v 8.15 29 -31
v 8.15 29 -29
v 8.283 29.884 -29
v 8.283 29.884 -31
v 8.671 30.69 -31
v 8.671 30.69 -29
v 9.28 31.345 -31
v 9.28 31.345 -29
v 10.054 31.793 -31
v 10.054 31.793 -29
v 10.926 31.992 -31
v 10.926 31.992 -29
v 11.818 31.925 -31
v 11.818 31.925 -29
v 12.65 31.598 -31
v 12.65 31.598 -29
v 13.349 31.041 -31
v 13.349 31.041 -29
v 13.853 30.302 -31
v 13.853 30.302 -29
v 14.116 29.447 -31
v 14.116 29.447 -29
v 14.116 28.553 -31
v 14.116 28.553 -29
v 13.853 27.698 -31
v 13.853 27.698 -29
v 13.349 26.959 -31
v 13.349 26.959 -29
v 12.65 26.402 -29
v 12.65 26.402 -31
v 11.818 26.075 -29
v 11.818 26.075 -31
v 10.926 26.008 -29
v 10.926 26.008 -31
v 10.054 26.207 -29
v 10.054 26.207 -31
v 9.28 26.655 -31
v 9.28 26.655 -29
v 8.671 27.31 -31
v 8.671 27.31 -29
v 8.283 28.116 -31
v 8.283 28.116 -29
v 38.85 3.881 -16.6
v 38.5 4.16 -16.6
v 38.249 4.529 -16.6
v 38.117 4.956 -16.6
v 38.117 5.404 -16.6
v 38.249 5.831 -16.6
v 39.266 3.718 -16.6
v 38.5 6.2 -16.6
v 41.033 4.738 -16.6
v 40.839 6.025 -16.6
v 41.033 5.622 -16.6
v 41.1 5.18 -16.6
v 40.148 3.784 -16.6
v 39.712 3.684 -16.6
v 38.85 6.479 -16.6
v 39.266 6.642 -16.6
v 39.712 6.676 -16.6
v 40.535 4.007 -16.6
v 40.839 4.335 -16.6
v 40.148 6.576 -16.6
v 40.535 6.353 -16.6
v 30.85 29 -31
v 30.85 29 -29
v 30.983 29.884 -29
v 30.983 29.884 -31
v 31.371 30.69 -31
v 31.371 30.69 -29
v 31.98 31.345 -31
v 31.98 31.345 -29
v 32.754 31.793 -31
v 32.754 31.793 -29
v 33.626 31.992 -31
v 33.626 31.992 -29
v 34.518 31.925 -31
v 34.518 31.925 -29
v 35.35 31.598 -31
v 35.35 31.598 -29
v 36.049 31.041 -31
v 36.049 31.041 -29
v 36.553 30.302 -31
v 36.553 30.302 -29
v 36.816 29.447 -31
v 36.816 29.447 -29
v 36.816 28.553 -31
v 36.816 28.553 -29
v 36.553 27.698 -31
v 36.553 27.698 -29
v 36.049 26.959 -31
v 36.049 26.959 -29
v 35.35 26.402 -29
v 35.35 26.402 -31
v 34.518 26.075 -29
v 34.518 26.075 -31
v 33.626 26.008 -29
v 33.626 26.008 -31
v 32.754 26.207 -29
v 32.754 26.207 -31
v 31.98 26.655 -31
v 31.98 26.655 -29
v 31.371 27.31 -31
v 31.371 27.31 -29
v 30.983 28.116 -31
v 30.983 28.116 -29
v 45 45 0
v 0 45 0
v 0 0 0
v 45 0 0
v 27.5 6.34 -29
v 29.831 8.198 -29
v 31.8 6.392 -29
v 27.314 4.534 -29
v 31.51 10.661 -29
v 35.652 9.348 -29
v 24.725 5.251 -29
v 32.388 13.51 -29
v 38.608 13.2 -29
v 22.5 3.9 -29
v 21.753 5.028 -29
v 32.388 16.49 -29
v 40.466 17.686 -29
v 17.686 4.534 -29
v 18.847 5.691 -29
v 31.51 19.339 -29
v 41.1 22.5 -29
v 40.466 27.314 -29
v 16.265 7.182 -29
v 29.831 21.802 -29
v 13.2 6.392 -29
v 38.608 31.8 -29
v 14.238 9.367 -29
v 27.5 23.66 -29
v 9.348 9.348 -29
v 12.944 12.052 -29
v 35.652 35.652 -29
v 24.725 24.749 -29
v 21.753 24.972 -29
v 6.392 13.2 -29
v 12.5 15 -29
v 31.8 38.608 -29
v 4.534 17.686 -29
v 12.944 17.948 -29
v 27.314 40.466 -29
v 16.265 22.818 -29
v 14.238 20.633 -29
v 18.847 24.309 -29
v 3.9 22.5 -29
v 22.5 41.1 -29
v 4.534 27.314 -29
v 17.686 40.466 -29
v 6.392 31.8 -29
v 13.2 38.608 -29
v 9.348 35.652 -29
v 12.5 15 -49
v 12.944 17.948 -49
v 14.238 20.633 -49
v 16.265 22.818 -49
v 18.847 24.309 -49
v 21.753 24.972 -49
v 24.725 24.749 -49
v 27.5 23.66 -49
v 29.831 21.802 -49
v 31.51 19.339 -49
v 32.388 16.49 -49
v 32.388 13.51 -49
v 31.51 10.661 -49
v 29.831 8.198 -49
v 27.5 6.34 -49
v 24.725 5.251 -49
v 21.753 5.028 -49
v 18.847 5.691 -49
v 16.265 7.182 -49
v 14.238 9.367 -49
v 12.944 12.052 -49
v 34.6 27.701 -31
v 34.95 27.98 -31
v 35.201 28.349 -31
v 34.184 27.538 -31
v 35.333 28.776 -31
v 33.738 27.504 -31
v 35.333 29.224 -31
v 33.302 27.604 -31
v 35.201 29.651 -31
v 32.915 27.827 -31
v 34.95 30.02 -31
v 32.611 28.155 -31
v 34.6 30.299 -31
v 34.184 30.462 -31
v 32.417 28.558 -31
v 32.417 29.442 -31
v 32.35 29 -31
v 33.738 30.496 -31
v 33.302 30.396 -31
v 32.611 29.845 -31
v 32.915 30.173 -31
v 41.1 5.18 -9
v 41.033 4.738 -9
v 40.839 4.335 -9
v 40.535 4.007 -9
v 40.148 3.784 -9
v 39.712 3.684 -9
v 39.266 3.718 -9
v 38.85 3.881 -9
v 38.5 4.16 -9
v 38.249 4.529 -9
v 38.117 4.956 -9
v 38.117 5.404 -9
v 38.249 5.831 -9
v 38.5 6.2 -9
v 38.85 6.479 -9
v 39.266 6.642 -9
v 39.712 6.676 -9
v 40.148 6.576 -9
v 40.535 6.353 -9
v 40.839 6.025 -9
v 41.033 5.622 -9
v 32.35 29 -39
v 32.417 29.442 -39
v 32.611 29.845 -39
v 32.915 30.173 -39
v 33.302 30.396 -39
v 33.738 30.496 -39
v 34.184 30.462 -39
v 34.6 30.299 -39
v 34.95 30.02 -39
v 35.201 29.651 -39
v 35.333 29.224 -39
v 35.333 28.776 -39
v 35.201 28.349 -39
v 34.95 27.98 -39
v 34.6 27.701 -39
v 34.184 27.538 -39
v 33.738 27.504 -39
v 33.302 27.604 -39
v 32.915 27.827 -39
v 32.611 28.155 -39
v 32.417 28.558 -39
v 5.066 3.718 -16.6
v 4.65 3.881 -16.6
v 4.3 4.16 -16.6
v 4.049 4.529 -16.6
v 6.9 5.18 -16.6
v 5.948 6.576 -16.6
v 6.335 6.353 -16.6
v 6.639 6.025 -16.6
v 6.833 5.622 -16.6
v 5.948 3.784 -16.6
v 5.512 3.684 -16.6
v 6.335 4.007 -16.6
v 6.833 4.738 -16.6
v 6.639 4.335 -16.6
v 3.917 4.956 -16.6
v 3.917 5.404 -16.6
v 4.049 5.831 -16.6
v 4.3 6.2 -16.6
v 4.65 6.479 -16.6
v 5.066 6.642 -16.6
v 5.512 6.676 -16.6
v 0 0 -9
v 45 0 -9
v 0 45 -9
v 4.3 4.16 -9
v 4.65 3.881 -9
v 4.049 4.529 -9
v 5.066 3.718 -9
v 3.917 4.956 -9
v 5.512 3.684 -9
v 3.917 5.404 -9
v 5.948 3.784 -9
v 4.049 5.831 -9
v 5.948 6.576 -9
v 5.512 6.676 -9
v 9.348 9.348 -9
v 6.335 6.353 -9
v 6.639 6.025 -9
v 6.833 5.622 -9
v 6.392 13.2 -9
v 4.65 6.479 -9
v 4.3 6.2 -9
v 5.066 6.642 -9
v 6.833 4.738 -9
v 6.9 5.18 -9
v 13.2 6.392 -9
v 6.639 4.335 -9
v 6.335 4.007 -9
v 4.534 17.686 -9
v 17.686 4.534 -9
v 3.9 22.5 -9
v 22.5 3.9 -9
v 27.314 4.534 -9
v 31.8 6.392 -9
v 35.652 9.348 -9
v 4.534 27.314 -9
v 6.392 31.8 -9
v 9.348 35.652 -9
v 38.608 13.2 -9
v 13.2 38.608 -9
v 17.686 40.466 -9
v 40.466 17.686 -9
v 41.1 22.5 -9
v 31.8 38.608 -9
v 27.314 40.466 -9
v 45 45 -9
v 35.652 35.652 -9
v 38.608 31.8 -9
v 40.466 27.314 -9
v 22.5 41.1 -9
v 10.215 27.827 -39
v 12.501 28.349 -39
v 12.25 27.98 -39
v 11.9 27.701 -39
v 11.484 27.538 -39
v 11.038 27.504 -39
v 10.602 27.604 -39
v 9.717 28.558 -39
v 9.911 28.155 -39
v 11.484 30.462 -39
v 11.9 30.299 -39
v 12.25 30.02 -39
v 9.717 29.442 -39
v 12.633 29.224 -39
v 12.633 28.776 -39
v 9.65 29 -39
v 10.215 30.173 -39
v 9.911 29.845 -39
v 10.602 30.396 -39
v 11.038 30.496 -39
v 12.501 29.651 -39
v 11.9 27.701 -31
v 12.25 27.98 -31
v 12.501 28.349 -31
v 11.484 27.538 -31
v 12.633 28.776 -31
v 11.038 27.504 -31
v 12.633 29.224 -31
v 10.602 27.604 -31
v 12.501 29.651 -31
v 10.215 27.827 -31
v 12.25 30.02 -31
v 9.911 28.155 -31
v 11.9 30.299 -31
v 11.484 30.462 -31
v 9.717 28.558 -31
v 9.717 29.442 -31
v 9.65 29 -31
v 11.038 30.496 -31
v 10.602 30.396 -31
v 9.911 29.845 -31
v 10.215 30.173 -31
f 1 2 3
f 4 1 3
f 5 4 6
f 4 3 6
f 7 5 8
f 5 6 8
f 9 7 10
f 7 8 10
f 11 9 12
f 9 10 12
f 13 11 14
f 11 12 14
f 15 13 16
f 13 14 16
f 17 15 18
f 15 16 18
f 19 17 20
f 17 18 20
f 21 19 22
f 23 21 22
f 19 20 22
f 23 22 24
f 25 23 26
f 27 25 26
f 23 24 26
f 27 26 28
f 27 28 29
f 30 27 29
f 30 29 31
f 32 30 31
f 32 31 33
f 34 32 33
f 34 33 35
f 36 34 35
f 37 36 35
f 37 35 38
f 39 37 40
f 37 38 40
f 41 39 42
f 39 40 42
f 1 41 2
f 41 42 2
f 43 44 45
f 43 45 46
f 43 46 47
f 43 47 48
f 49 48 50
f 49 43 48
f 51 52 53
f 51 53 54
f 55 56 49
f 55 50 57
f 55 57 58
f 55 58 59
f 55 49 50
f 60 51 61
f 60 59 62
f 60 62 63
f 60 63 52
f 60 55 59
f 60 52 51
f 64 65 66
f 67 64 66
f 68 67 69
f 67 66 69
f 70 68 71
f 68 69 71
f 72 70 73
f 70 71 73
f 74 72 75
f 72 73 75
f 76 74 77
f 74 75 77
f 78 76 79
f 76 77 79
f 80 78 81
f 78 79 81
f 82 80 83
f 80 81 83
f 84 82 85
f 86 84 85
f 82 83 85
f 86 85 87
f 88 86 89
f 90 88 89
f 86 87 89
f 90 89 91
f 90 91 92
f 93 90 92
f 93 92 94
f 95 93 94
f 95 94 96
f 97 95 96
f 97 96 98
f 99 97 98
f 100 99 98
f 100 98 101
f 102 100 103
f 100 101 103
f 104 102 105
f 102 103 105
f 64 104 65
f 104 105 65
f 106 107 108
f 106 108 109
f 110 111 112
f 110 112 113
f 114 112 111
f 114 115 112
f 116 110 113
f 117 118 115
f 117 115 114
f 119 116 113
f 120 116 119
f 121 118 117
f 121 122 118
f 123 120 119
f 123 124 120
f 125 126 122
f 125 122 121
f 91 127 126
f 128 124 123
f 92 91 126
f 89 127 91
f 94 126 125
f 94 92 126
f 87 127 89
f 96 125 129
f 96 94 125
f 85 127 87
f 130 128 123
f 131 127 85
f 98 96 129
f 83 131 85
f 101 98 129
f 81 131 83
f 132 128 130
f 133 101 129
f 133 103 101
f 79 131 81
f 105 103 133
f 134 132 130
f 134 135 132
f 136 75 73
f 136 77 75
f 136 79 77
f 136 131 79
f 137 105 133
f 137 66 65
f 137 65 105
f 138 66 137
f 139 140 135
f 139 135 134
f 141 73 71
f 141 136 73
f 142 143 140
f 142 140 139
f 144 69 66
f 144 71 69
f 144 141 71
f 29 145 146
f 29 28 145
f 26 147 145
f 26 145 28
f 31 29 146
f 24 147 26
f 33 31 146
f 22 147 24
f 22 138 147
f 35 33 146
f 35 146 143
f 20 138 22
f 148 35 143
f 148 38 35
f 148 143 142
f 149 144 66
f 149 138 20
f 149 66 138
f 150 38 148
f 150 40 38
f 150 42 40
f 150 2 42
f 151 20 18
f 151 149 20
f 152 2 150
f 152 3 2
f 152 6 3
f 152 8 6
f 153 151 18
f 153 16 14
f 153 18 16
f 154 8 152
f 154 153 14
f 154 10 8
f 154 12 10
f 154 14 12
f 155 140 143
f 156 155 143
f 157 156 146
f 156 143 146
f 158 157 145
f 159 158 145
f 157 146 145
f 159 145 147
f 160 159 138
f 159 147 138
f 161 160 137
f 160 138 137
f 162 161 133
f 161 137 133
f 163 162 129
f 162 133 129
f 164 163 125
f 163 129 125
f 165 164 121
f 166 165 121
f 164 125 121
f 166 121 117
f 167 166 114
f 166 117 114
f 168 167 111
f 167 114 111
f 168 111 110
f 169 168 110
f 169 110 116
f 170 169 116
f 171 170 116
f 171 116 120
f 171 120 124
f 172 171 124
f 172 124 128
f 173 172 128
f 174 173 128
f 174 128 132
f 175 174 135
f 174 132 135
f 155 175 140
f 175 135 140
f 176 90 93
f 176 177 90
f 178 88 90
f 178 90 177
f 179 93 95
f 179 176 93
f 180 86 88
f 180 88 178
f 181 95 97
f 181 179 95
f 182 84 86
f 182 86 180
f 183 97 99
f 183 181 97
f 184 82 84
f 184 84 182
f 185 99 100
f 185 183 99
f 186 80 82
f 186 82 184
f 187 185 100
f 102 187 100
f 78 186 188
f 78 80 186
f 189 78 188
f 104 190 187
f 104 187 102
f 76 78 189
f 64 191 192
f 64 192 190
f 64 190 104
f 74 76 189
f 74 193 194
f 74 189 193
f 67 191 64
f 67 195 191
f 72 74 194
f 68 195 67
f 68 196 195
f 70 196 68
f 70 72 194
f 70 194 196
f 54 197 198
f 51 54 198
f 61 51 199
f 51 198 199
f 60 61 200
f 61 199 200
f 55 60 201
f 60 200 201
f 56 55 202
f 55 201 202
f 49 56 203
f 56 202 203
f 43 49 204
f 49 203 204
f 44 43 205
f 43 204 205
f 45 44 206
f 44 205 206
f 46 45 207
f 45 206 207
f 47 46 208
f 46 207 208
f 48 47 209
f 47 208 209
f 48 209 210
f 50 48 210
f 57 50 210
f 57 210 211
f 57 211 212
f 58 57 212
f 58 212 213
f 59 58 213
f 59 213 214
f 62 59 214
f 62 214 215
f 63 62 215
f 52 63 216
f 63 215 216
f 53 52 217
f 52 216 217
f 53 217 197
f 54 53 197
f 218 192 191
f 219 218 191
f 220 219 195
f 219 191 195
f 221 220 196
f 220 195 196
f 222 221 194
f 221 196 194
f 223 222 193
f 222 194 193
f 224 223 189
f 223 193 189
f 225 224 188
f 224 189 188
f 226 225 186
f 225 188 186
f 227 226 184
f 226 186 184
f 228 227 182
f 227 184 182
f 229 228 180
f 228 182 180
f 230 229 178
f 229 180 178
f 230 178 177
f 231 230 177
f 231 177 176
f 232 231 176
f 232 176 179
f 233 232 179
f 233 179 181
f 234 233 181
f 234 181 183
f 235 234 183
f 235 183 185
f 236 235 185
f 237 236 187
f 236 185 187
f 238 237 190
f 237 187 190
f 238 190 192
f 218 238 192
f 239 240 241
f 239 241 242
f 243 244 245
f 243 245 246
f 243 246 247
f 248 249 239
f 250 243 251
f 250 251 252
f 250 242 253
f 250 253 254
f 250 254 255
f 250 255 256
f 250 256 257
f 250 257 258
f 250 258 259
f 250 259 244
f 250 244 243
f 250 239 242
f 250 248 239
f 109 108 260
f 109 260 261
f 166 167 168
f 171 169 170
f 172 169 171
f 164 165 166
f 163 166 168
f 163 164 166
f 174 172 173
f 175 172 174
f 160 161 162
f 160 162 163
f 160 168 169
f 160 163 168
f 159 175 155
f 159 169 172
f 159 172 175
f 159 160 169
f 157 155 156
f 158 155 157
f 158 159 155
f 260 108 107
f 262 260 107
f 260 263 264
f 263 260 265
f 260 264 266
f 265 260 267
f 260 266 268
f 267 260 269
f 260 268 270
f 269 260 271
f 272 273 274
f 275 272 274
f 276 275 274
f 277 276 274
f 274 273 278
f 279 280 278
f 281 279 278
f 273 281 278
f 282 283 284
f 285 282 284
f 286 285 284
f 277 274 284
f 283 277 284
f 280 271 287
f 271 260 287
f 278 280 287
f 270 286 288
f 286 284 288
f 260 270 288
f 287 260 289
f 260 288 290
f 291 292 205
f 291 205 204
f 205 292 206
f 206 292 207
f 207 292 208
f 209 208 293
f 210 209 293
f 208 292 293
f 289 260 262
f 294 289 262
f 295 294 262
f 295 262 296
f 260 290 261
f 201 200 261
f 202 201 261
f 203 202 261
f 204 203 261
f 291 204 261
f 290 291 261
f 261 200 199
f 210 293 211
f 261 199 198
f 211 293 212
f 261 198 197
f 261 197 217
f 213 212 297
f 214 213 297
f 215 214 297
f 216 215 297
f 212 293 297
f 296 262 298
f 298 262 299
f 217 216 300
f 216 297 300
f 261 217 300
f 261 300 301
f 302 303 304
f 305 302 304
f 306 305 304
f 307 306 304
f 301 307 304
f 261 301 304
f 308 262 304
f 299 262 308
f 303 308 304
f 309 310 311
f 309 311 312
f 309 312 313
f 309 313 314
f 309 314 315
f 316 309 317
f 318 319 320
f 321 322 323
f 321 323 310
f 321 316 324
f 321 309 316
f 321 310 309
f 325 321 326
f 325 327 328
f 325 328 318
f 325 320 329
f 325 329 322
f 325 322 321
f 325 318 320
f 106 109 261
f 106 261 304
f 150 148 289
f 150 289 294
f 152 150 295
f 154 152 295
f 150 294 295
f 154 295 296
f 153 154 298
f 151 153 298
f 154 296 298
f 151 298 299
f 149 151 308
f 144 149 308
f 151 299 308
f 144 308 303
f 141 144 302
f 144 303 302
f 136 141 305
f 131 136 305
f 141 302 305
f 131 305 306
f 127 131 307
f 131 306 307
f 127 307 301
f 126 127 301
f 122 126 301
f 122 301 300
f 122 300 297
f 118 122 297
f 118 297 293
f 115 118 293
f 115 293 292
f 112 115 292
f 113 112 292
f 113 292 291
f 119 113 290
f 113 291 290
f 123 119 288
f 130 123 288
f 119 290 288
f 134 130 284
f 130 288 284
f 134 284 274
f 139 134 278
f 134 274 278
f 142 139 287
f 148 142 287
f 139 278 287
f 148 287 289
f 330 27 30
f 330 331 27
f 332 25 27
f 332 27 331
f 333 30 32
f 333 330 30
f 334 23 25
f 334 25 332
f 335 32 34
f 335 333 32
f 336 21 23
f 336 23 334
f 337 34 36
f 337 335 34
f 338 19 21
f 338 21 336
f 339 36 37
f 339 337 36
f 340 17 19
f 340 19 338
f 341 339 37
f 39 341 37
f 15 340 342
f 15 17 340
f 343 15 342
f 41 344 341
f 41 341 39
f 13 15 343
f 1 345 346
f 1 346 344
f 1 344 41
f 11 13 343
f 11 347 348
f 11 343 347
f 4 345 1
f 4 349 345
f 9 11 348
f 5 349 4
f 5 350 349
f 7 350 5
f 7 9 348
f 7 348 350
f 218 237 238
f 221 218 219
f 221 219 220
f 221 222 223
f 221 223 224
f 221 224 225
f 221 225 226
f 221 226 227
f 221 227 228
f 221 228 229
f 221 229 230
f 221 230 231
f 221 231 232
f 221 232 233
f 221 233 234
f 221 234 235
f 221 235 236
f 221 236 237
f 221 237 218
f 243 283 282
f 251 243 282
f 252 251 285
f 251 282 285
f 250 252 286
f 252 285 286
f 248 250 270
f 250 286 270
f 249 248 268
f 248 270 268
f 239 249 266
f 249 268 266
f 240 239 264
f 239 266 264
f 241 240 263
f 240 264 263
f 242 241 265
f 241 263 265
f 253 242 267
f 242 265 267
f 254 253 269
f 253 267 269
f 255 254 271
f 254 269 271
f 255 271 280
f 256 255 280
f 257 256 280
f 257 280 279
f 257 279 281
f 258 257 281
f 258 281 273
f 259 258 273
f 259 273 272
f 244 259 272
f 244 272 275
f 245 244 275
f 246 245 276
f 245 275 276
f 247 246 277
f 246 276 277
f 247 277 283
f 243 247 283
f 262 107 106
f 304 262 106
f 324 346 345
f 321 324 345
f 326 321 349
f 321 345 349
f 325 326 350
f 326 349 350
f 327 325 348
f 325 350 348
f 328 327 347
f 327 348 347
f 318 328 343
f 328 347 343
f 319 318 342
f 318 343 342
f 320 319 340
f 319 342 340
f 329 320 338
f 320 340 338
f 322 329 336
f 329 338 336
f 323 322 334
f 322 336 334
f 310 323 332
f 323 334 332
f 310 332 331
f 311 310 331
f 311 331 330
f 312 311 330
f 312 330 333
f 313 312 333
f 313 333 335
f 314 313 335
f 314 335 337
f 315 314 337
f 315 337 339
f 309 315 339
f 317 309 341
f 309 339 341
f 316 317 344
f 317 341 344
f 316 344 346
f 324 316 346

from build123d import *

# Parameters (mm, degrees)
SKETCH_1_W      = 45
SKETCH_1_H      = 45
EXTRUDE_1_DEPTH = 9
SKETCH_2_R      = 18.6
EXTRUDE_2_DEPTH = 20
SKETCH_3_R      = 3
EXTRUDE_3_DEPTH = 2
SKETCH_4_R      = 1.5
EXTRUDE_4_DEPTH = 8
SKETCH_5_R      = 10
EXTRUDE_5_DEPTH = 20
SKETCH_6_R      = 1.5
EXTRUDE_6_DEPTH = 7.6


with BuildPart() as part:
    # 草图1 → 凸台-拉伸1 (new body)
    with BuildSketch(Plane.XY):
        with Locations((22.5, 22.5)):
            Rectangle(SKETCH_1_W, SKETCH_1_H)
    extrude(amount=-EXTRUDE_1_DEPTH)

    # 草图2 → 凸台-拉伸2 (add)
    with BuildSketch(Plane(origin=(0, 0, -9), x_dir=(-1, 0, 0), z_dir=(0, 0, -1))):
        with Locations((-22.5, 22.5)):
            Circle(SKETCH_2_R)
    extrude(amount=EXTRUDE_2_DEPTH)

    # 草图3 → 凸台-拉伸3 (add)
    with BuildSketch(Plane(origin=(0, 0, -29), x_dir=(-1, 0, 0), z_dir=(0, 0, -1))):
        with Locations((-33.85, 29)):
            Circle(SKETCH_3_R)
        with Locations((-11.15, 29)):
            Circle(SKETCH_3_R)
    extrude(amount=EXTRUDE_3_DEPTH)

    # 草图4 → 凸台-拉伸4 (add)
    with BuildSketch(Plane(origin=(0, 0, -31), x_dir=(-1, 0, 0), z_dir=(0, 0, -1))):
        with Locations((-33.85, 29)):
            Circle(SKETCH_4_R)
        with Locations((-11.15, 29)):
            Circle(SKETCH_4_R)
    extrude(amount=EXTRUDE_4_DEPTH)

    # 草图5 → 凸台-拉伸5 (add)
    with BuildSketch(Plane(origin=(0, 0, -29), x_dir=(-1, 0, 0), z_dir=(0, 0, -1))):
        with Locations((-22.5, 15)):
            Circle(SKETCH_5_R)
    extrude(amount=EXTRUDE_5_DEPTH)

    # 草图6 → 凸台-拉伸6 (add)
    with BuildSketch(Plane(origin=(0, 0, -9), x_dir=(-1, 0, 0), z_dir=(0, 0, -1))):
        with Locations(Location((-39.6, 5.18, 0), (0, 0, 180))):
            Circle(SKETCH_6_R)
        with Locations(Location((-5.4, 5.18, 0), (0, 0, 180))):
            Circle(SKETCH_6_R)
    extrude(amount=EXTRUDE_6_DEPTH)


solid = part.part
